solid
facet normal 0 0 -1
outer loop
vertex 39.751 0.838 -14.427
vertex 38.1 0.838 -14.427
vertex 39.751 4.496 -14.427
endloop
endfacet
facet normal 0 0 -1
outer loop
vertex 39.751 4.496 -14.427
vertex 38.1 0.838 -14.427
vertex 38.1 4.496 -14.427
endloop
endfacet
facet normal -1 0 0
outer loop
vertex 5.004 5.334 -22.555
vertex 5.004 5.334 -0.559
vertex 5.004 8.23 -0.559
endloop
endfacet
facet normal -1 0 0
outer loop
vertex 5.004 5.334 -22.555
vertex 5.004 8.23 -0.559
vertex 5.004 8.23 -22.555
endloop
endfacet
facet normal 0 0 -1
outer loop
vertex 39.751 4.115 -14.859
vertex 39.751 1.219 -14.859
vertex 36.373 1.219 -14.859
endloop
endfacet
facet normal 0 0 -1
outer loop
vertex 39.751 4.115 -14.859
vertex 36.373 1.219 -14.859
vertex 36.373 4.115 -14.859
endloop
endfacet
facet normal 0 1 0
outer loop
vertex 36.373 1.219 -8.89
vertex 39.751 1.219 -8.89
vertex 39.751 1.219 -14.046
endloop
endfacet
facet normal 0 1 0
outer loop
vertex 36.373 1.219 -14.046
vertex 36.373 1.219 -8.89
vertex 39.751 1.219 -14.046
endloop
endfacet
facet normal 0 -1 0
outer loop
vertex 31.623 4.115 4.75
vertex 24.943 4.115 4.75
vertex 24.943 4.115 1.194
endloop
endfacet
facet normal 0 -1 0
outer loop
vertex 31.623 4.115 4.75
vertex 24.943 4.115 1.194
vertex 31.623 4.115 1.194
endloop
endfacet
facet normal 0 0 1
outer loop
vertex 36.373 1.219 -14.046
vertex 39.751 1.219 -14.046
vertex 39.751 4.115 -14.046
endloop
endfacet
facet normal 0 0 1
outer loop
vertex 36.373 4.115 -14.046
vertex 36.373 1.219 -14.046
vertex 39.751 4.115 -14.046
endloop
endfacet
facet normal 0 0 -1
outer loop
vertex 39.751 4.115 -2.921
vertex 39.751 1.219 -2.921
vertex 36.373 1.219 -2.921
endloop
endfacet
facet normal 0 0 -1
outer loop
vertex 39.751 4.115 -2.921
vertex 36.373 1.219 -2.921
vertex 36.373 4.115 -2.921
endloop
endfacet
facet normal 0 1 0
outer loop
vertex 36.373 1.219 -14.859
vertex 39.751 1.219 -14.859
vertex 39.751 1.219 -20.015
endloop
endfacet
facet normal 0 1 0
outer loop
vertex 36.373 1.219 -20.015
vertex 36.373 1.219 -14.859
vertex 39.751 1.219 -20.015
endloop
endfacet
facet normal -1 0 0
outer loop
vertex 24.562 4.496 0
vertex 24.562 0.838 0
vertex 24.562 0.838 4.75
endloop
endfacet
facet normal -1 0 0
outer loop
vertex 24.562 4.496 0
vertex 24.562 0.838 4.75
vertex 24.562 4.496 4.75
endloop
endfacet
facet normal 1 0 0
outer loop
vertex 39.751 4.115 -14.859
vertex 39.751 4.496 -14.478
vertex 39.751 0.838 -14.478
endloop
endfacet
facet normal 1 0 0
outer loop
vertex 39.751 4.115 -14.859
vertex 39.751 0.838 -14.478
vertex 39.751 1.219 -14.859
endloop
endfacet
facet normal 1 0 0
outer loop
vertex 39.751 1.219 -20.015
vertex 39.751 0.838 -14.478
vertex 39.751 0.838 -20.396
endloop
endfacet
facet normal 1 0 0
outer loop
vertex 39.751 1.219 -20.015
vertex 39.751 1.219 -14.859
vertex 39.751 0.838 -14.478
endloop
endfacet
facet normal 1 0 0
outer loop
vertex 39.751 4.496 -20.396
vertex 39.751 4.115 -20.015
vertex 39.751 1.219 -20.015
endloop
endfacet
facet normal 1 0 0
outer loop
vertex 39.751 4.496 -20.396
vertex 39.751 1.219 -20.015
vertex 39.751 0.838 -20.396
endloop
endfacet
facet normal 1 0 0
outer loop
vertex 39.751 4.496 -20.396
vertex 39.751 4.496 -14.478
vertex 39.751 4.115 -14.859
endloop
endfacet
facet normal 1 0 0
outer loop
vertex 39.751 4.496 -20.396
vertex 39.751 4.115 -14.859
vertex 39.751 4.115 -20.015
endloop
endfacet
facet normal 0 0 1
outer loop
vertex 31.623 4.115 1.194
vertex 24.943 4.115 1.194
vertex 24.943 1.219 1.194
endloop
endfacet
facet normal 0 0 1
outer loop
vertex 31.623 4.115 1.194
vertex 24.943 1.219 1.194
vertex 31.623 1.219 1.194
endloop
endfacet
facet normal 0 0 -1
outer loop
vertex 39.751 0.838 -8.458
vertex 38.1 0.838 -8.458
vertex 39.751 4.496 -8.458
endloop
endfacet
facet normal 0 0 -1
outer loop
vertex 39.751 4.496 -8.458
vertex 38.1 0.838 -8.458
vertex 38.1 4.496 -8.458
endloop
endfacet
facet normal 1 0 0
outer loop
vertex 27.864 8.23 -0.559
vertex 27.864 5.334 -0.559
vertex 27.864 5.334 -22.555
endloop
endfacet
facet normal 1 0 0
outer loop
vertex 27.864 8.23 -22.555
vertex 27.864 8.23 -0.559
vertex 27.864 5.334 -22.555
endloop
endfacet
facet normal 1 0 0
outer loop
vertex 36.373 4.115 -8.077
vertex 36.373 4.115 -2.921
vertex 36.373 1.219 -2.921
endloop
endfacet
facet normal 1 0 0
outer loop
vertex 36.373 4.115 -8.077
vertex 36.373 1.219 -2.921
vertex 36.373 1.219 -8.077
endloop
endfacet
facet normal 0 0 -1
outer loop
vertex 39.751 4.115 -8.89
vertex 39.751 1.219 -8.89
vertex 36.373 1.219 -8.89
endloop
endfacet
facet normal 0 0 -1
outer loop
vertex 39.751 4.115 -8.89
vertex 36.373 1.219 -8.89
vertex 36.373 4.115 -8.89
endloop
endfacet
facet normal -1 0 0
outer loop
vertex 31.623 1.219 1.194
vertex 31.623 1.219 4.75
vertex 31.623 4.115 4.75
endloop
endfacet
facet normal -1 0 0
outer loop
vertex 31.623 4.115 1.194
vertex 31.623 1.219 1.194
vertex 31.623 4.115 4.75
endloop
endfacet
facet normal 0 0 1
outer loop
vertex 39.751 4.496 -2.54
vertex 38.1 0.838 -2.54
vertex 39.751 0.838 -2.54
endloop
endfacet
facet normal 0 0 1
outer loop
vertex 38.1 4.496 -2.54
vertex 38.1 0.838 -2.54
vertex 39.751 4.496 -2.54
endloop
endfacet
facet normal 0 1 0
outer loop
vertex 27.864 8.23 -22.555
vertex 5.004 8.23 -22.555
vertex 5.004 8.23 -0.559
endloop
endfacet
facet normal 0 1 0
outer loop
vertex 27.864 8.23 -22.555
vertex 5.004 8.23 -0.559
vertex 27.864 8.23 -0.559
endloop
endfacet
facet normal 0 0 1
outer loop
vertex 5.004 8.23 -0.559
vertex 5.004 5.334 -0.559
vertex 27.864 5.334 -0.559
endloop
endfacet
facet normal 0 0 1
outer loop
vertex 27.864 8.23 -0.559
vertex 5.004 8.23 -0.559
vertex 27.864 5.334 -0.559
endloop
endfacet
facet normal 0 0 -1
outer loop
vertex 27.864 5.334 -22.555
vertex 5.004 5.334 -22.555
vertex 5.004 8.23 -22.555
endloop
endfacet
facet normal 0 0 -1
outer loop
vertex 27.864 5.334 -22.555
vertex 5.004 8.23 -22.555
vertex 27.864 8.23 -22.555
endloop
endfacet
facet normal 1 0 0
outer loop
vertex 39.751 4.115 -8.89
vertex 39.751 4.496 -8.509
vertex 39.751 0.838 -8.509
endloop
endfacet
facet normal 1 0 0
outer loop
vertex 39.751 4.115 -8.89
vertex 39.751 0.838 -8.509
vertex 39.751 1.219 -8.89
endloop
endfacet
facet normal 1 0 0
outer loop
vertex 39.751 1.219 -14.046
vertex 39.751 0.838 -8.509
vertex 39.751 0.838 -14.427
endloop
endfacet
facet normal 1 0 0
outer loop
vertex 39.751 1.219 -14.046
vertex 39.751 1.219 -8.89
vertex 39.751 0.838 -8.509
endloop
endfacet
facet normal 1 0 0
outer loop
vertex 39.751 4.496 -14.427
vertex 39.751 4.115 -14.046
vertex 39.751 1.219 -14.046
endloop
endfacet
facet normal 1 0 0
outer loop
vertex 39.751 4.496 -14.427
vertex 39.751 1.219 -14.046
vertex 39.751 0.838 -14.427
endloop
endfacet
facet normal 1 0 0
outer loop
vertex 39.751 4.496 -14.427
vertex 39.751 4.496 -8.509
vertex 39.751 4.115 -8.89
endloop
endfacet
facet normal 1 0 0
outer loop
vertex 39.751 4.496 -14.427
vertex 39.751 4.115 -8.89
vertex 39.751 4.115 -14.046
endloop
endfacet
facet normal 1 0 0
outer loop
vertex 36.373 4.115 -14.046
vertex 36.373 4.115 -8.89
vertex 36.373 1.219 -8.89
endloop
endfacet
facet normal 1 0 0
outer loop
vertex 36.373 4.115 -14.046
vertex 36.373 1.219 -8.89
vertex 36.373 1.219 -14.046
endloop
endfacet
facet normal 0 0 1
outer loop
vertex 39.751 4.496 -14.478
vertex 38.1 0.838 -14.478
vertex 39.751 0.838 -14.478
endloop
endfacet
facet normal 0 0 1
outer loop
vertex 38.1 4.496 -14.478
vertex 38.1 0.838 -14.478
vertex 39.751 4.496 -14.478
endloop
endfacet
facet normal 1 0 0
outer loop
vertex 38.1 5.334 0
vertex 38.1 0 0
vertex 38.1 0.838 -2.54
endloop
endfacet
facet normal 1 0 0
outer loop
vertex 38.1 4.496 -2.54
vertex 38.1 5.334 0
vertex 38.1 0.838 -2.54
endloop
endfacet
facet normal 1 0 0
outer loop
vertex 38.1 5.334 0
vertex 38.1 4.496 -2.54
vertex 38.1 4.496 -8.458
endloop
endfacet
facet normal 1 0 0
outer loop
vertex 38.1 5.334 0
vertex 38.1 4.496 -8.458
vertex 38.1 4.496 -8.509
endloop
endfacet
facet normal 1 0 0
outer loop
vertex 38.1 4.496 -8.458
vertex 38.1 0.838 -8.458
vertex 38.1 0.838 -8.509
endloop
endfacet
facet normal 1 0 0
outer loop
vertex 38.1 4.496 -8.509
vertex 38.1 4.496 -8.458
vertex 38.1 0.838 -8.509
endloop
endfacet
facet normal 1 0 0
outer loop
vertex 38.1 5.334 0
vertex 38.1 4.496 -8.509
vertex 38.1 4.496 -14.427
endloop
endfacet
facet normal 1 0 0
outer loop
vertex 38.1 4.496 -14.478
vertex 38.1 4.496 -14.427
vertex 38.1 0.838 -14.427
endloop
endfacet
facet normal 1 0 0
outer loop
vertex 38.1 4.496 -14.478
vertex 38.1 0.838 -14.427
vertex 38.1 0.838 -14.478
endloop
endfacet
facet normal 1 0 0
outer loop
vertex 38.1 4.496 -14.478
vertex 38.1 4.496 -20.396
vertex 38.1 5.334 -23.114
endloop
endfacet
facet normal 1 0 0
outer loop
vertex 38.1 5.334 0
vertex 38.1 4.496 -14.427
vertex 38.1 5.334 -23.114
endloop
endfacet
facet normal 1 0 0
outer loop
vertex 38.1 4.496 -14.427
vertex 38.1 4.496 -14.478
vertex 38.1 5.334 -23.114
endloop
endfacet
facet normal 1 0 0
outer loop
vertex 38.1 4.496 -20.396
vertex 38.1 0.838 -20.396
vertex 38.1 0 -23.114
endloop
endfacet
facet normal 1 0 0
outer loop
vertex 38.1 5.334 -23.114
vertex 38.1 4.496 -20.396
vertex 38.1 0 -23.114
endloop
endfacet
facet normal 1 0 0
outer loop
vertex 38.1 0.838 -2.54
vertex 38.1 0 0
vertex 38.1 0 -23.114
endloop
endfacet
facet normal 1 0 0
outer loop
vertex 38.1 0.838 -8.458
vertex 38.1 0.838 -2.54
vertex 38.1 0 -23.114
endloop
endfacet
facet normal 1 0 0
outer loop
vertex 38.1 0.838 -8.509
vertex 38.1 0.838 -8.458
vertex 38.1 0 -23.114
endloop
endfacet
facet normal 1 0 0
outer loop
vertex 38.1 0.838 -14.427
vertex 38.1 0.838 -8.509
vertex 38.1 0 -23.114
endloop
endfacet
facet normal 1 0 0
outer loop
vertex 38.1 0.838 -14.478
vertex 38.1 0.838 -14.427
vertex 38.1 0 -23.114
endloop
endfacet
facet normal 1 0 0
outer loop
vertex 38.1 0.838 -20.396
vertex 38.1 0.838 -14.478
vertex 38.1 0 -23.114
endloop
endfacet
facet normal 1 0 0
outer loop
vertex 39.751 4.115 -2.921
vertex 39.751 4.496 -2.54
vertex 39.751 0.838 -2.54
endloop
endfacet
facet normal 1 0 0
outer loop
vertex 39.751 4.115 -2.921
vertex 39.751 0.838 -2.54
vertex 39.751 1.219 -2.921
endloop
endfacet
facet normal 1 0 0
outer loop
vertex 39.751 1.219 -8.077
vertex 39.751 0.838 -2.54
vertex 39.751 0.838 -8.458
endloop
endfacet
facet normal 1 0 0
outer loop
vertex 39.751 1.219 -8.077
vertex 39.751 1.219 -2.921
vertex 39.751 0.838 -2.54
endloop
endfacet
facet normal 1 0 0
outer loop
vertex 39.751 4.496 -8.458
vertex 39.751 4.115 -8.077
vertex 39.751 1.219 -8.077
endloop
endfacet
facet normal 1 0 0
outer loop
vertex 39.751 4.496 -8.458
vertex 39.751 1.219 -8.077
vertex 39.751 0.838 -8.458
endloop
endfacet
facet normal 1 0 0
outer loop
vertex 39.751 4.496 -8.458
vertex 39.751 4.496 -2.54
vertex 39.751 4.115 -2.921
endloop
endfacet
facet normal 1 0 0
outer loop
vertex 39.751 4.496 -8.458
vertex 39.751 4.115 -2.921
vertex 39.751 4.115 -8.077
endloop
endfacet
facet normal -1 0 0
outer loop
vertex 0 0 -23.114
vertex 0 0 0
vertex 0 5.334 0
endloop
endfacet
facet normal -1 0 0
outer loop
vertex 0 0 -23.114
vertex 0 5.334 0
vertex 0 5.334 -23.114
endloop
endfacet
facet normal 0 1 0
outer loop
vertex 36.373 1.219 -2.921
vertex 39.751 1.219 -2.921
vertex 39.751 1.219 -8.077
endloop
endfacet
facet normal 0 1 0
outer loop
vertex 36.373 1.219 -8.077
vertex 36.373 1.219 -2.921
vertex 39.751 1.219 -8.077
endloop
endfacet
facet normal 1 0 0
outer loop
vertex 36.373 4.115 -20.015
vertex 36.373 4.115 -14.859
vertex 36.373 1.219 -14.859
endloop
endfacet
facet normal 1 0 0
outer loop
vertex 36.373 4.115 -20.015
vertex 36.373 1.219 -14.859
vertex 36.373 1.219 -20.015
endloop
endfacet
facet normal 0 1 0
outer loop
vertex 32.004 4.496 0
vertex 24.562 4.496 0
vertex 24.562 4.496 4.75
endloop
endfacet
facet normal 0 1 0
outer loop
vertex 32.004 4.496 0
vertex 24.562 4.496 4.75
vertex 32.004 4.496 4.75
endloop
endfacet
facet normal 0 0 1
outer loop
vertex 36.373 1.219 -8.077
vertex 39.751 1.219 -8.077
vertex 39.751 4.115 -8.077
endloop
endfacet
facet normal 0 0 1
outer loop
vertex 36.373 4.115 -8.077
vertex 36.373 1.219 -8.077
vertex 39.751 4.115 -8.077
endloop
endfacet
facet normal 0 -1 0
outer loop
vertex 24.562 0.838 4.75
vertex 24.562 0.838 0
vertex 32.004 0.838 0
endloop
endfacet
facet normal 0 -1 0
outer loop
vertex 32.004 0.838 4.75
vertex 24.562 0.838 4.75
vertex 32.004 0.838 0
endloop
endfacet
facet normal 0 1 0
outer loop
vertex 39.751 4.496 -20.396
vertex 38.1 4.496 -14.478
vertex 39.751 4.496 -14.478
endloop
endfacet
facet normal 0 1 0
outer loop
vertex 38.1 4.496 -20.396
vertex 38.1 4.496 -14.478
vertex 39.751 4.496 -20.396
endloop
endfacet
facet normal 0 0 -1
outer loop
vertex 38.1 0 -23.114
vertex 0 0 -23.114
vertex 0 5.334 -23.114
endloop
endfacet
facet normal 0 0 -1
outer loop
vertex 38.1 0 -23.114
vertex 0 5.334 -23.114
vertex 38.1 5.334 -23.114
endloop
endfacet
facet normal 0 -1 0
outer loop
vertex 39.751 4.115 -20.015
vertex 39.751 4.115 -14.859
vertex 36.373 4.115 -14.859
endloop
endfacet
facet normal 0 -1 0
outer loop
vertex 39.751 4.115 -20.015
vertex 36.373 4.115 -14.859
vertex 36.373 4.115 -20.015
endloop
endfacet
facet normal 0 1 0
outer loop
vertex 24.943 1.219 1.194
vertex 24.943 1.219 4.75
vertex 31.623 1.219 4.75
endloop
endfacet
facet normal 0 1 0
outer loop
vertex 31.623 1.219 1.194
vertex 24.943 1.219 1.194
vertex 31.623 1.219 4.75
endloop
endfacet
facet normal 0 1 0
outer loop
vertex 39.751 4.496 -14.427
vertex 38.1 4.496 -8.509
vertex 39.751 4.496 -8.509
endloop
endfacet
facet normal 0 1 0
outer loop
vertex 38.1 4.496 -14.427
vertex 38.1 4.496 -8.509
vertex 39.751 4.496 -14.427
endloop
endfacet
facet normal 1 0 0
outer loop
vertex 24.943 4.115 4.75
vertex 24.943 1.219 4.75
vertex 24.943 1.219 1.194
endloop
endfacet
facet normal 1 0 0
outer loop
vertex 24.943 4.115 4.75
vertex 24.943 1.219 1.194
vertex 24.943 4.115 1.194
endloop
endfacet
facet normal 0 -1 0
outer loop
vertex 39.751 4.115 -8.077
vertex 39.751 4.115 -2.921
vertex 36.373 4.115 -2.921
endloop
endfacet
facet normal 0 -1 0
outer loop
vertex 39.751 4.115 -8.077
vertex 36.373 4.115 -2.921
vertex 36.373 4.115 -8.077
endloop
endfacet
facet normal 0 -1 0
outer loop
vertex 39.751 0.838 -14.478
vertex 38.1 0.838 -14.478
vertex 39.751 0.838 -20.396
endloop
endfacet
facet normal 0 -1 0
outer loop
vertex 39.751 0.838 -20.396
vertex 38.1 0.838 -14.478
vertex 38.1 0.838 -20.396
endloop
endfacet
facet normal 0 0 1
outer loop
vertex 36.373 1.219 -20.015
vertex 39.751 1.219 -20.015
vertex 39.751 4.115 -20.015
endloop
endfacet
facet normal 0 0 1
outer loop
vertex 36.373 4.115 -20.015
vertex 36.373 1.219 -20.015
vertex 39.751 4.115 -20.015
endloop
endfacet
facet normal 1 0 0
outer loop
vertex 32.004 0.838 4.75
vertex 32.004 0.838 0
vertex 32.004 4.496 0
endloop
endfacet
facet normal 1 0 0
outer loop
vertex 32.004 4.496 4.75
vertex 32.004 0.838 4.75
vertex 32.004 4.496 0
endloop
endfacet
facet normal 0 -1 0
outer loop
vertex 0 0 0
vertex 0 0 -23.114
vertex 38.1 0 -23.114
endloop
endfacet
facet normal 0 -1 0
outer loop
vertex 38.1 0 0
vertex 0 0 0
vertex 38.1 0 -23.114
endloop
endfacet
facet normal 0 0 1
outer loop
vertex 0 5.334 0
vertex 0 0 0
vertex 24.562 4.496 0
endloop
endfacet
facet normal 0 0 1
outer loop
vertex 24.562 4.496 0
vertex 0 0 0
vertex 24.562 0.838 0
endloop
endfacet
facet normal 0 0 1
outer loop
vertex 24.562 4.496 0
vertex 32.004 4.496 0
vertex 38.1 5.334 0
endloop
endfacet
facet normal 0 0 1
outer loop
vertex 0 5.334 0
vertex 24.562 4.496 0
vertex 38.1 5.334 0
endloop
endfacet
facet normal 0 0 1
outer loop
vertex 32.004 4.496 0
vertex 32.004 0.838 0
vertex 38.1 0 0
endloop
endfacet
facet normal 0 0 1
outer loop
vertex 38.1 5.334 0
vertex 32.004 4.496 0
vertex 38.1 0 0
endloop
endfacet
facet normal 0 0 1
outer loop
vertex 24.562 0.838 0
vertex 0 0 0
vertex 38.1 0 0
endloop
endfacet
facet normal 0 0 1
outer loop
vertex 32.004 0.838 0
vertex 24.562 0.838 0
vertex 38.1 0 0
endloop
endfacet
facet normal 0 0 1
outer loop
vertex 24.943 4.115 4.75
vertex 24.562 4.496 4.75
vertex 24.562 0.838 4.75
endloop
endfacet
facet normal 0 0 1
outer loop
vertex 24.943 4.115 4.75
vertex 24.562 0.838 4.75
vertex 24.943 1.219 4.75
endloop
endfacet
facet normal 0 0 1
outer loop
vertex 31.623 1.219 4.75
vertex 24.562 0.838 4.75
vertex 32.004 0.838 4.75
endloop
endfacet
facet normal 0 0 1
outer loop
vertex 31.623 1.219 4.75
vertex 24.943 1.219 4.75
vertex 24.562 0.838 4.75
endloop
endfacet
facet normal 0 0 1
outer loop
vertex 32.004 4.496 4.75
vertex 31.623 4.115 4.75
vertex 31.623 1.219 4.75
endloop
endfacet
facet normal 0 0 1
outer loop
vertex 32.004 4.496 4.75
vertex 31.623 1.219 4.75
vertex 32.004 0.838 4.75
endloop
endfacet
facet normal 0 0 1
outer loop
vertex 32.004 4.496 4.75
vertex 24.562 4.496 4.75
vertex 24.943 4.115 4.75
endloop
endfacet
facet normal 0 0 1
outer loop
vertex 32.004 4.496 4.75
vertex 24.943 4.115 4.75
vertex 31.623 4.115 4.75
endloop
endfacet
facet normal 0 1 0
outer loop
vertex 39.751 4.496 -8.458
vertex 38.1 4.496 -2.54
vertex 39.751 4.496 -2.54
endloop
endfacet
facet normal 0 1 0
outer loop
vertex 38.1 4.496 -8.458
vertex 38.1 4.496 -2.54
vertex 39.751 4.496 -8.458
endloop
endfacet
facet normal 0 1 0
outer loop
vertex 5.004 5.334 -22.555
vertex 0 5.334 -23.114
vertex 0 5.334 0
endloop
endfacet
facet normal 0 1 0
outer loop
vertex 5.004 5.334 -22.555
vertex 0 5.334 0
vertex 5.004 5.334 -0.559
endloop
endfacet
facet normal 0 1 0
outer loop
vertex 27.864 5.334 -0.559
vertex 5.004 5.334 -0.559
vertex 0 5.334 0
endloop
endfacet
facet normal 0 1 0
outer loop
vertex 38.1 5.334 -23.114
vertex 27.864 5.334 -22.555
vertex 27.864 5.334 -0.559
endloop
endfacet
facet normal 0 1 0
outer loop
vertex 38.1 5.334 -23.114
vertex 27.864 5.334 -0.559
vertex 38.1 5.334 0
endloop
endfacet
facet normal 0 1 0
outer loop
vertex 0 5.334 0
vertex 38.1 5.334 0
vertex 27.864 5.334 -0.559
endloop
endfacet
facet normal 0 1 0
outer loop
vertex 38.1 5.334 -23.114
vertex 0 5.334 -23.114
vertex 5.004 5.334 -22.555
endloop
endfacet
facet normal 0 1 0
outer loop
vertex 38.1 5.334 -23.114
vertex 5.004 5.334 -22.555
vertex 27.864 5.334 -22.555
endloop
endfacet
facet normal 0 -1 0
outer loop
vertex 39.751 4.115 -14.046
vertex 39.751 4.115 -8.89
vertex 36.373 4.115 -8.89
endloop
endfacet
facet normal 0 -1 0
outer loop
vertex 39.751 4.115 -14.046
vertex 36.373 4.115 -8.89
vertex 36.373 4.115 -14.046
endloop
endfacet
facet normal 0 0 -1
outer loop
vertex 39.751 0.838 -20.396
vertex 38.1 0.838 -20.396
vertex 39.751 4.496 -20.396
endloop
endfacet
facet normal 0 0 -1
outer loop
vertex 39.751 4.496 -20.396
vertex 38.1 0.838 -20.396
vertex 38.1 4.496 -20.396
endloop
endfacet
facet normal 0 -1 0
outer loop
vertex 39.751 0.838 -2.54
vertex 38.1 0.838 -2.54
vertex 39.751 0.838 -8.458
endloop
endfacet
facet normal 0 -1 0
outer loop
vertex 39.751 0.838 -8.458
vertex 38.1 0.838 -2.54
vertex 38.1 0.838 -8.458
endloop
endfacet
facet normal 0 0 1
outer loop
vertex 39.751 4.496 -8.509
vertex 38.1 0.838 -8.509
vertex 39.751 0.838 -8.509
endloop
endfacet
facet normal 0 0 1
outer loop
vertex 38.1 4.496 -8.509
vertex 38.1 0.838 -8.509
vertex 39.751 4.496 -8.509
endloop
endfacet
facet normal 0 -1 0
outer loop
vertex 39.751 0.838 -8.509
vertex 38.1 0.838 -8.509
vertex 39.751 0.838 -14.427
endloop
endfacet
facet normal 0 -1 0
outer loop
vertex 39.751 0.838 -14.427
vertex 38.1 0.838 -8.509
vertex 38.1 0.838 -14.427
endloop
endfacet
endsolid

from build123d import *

# Parameters (mm, degrees)
SKETCH1_W           = 38.1
SKETCH1_H           = 23.114
BOSS_EXTRUDE1_DEPTH = 5.334
SKETCH2_W           = 22.86
SKETCH2_H           = 21.9964
BOSS_EXTRUDE2_DEPTH = 2.8956
SKETCH3_W           = 7.4422
SKETCH3_H           = 3.6576
BOSS_EXTRUDE3_DEPTH = 4.7498
SKETCH4_W           = 6.6802
SKETCH4_H           = 2.8956
CUT_EXTRUDE1_DEPTH  = 3.556
SKETCH5_W           = 5.9182
SKETCH5_H           = 3.6576
BOSS_EXTRUDE4_DEPTH = 1.651
SKETCH6_W           = 5.1562
SKETCH6_H           = 2.8956
CUT_EXTRUDE2_DEPTH  = 3.3782
LPATTERN1_COUNT     = 3
LPATTERN1_PITCH     = 5.969


with BuildPart() as part:
    # Sketch1 → Boss-Extrude1 (new body)
    with BuildSketch(Plane(origin=(0, 0, 0), x_dir=(1, 0, 0), z_dir=(0, 1, 0))):
        with Locations((19.05, 11.557)):
            Rectangle(SKETCH1_W, SKETCH1_H)
    extrude(amount=BOSS_EXTRUDE1_DEPTH)

    # Sketch2 → Boss-Extrude2 (add)
    with BuildSketch(Plane(origin=(0, 5.334, 0), x_dir=(1, 0, 0), z_dir=(0, 1, 0))):
        with Locations((16.4338, 11.557)):
            Rectangle(SKETCH2_W, SKETCH2_H)
    extrude(amount=BOSS_EXTRUDE2_DEPTH)

    # Sketch3 → Boss-Extrude3 (add)
    with BuildSketch(Plane.XY):
        with Locations((28.2829, 2.667)):
            Rectangle(SKETCH3_W, SKETCH3_H)
    extrude(amount=BOSS_EXTRUDE3_DEPTH)

    # Sketch4 → Cut-Extrude1 (cut)
    with BuildSketch(Plane.XY.offset(4.7498)):
        with Locations((28.2829, 2.667)):
            Rectangle(SKETCH4_W, SKETCH4_H)
    extrude(amount=-CUT_EXTRUDE1_DEPTH, mode=Mode.SUBTRACT)

    # Sketch5 → Boss-Extrude4 (add)
    with BuildSketch(Plane(origin=(38.1, 0, 0), x_dir=(0, 0, -1), z_dir=(1, 0, 0))):
        with Locations((5.4991, 2.667)):
            Rectangle(SKETCH5_W, SKETCH5_H)
    boss_extrude4 = extrude(amount=BOSS_EXTRUDE4_DEPTH)

    # Sketch6 → Cut-Extrude2 (cut)
    with BuildSketch(Plane(origin=(39.751, 0, 0), x_dir=(0, 0, -1), z_dir=(1, 0, 0))):
        with Locations((5.4991, 2.667)):
            Rectangle(SKETCH6_W, SKETCH6_H)
    cut_extrude2 = extrude(amount=-CUT_EXTRUDE2_DEPTH, mode=Mode.SUBTRACT)

    # LPattern1: Boss-Extrude4, Cut-Extrude2 ×3
    with Locations(*[(0, 0, -i * LPATTERN1_PITCH) for i in range(1, LPATTERN1_COUNT)]):
        add(boss_extrude4)
        add(cut_extrude2, mode=Mode.SUBTRACT)


solid = part.part
